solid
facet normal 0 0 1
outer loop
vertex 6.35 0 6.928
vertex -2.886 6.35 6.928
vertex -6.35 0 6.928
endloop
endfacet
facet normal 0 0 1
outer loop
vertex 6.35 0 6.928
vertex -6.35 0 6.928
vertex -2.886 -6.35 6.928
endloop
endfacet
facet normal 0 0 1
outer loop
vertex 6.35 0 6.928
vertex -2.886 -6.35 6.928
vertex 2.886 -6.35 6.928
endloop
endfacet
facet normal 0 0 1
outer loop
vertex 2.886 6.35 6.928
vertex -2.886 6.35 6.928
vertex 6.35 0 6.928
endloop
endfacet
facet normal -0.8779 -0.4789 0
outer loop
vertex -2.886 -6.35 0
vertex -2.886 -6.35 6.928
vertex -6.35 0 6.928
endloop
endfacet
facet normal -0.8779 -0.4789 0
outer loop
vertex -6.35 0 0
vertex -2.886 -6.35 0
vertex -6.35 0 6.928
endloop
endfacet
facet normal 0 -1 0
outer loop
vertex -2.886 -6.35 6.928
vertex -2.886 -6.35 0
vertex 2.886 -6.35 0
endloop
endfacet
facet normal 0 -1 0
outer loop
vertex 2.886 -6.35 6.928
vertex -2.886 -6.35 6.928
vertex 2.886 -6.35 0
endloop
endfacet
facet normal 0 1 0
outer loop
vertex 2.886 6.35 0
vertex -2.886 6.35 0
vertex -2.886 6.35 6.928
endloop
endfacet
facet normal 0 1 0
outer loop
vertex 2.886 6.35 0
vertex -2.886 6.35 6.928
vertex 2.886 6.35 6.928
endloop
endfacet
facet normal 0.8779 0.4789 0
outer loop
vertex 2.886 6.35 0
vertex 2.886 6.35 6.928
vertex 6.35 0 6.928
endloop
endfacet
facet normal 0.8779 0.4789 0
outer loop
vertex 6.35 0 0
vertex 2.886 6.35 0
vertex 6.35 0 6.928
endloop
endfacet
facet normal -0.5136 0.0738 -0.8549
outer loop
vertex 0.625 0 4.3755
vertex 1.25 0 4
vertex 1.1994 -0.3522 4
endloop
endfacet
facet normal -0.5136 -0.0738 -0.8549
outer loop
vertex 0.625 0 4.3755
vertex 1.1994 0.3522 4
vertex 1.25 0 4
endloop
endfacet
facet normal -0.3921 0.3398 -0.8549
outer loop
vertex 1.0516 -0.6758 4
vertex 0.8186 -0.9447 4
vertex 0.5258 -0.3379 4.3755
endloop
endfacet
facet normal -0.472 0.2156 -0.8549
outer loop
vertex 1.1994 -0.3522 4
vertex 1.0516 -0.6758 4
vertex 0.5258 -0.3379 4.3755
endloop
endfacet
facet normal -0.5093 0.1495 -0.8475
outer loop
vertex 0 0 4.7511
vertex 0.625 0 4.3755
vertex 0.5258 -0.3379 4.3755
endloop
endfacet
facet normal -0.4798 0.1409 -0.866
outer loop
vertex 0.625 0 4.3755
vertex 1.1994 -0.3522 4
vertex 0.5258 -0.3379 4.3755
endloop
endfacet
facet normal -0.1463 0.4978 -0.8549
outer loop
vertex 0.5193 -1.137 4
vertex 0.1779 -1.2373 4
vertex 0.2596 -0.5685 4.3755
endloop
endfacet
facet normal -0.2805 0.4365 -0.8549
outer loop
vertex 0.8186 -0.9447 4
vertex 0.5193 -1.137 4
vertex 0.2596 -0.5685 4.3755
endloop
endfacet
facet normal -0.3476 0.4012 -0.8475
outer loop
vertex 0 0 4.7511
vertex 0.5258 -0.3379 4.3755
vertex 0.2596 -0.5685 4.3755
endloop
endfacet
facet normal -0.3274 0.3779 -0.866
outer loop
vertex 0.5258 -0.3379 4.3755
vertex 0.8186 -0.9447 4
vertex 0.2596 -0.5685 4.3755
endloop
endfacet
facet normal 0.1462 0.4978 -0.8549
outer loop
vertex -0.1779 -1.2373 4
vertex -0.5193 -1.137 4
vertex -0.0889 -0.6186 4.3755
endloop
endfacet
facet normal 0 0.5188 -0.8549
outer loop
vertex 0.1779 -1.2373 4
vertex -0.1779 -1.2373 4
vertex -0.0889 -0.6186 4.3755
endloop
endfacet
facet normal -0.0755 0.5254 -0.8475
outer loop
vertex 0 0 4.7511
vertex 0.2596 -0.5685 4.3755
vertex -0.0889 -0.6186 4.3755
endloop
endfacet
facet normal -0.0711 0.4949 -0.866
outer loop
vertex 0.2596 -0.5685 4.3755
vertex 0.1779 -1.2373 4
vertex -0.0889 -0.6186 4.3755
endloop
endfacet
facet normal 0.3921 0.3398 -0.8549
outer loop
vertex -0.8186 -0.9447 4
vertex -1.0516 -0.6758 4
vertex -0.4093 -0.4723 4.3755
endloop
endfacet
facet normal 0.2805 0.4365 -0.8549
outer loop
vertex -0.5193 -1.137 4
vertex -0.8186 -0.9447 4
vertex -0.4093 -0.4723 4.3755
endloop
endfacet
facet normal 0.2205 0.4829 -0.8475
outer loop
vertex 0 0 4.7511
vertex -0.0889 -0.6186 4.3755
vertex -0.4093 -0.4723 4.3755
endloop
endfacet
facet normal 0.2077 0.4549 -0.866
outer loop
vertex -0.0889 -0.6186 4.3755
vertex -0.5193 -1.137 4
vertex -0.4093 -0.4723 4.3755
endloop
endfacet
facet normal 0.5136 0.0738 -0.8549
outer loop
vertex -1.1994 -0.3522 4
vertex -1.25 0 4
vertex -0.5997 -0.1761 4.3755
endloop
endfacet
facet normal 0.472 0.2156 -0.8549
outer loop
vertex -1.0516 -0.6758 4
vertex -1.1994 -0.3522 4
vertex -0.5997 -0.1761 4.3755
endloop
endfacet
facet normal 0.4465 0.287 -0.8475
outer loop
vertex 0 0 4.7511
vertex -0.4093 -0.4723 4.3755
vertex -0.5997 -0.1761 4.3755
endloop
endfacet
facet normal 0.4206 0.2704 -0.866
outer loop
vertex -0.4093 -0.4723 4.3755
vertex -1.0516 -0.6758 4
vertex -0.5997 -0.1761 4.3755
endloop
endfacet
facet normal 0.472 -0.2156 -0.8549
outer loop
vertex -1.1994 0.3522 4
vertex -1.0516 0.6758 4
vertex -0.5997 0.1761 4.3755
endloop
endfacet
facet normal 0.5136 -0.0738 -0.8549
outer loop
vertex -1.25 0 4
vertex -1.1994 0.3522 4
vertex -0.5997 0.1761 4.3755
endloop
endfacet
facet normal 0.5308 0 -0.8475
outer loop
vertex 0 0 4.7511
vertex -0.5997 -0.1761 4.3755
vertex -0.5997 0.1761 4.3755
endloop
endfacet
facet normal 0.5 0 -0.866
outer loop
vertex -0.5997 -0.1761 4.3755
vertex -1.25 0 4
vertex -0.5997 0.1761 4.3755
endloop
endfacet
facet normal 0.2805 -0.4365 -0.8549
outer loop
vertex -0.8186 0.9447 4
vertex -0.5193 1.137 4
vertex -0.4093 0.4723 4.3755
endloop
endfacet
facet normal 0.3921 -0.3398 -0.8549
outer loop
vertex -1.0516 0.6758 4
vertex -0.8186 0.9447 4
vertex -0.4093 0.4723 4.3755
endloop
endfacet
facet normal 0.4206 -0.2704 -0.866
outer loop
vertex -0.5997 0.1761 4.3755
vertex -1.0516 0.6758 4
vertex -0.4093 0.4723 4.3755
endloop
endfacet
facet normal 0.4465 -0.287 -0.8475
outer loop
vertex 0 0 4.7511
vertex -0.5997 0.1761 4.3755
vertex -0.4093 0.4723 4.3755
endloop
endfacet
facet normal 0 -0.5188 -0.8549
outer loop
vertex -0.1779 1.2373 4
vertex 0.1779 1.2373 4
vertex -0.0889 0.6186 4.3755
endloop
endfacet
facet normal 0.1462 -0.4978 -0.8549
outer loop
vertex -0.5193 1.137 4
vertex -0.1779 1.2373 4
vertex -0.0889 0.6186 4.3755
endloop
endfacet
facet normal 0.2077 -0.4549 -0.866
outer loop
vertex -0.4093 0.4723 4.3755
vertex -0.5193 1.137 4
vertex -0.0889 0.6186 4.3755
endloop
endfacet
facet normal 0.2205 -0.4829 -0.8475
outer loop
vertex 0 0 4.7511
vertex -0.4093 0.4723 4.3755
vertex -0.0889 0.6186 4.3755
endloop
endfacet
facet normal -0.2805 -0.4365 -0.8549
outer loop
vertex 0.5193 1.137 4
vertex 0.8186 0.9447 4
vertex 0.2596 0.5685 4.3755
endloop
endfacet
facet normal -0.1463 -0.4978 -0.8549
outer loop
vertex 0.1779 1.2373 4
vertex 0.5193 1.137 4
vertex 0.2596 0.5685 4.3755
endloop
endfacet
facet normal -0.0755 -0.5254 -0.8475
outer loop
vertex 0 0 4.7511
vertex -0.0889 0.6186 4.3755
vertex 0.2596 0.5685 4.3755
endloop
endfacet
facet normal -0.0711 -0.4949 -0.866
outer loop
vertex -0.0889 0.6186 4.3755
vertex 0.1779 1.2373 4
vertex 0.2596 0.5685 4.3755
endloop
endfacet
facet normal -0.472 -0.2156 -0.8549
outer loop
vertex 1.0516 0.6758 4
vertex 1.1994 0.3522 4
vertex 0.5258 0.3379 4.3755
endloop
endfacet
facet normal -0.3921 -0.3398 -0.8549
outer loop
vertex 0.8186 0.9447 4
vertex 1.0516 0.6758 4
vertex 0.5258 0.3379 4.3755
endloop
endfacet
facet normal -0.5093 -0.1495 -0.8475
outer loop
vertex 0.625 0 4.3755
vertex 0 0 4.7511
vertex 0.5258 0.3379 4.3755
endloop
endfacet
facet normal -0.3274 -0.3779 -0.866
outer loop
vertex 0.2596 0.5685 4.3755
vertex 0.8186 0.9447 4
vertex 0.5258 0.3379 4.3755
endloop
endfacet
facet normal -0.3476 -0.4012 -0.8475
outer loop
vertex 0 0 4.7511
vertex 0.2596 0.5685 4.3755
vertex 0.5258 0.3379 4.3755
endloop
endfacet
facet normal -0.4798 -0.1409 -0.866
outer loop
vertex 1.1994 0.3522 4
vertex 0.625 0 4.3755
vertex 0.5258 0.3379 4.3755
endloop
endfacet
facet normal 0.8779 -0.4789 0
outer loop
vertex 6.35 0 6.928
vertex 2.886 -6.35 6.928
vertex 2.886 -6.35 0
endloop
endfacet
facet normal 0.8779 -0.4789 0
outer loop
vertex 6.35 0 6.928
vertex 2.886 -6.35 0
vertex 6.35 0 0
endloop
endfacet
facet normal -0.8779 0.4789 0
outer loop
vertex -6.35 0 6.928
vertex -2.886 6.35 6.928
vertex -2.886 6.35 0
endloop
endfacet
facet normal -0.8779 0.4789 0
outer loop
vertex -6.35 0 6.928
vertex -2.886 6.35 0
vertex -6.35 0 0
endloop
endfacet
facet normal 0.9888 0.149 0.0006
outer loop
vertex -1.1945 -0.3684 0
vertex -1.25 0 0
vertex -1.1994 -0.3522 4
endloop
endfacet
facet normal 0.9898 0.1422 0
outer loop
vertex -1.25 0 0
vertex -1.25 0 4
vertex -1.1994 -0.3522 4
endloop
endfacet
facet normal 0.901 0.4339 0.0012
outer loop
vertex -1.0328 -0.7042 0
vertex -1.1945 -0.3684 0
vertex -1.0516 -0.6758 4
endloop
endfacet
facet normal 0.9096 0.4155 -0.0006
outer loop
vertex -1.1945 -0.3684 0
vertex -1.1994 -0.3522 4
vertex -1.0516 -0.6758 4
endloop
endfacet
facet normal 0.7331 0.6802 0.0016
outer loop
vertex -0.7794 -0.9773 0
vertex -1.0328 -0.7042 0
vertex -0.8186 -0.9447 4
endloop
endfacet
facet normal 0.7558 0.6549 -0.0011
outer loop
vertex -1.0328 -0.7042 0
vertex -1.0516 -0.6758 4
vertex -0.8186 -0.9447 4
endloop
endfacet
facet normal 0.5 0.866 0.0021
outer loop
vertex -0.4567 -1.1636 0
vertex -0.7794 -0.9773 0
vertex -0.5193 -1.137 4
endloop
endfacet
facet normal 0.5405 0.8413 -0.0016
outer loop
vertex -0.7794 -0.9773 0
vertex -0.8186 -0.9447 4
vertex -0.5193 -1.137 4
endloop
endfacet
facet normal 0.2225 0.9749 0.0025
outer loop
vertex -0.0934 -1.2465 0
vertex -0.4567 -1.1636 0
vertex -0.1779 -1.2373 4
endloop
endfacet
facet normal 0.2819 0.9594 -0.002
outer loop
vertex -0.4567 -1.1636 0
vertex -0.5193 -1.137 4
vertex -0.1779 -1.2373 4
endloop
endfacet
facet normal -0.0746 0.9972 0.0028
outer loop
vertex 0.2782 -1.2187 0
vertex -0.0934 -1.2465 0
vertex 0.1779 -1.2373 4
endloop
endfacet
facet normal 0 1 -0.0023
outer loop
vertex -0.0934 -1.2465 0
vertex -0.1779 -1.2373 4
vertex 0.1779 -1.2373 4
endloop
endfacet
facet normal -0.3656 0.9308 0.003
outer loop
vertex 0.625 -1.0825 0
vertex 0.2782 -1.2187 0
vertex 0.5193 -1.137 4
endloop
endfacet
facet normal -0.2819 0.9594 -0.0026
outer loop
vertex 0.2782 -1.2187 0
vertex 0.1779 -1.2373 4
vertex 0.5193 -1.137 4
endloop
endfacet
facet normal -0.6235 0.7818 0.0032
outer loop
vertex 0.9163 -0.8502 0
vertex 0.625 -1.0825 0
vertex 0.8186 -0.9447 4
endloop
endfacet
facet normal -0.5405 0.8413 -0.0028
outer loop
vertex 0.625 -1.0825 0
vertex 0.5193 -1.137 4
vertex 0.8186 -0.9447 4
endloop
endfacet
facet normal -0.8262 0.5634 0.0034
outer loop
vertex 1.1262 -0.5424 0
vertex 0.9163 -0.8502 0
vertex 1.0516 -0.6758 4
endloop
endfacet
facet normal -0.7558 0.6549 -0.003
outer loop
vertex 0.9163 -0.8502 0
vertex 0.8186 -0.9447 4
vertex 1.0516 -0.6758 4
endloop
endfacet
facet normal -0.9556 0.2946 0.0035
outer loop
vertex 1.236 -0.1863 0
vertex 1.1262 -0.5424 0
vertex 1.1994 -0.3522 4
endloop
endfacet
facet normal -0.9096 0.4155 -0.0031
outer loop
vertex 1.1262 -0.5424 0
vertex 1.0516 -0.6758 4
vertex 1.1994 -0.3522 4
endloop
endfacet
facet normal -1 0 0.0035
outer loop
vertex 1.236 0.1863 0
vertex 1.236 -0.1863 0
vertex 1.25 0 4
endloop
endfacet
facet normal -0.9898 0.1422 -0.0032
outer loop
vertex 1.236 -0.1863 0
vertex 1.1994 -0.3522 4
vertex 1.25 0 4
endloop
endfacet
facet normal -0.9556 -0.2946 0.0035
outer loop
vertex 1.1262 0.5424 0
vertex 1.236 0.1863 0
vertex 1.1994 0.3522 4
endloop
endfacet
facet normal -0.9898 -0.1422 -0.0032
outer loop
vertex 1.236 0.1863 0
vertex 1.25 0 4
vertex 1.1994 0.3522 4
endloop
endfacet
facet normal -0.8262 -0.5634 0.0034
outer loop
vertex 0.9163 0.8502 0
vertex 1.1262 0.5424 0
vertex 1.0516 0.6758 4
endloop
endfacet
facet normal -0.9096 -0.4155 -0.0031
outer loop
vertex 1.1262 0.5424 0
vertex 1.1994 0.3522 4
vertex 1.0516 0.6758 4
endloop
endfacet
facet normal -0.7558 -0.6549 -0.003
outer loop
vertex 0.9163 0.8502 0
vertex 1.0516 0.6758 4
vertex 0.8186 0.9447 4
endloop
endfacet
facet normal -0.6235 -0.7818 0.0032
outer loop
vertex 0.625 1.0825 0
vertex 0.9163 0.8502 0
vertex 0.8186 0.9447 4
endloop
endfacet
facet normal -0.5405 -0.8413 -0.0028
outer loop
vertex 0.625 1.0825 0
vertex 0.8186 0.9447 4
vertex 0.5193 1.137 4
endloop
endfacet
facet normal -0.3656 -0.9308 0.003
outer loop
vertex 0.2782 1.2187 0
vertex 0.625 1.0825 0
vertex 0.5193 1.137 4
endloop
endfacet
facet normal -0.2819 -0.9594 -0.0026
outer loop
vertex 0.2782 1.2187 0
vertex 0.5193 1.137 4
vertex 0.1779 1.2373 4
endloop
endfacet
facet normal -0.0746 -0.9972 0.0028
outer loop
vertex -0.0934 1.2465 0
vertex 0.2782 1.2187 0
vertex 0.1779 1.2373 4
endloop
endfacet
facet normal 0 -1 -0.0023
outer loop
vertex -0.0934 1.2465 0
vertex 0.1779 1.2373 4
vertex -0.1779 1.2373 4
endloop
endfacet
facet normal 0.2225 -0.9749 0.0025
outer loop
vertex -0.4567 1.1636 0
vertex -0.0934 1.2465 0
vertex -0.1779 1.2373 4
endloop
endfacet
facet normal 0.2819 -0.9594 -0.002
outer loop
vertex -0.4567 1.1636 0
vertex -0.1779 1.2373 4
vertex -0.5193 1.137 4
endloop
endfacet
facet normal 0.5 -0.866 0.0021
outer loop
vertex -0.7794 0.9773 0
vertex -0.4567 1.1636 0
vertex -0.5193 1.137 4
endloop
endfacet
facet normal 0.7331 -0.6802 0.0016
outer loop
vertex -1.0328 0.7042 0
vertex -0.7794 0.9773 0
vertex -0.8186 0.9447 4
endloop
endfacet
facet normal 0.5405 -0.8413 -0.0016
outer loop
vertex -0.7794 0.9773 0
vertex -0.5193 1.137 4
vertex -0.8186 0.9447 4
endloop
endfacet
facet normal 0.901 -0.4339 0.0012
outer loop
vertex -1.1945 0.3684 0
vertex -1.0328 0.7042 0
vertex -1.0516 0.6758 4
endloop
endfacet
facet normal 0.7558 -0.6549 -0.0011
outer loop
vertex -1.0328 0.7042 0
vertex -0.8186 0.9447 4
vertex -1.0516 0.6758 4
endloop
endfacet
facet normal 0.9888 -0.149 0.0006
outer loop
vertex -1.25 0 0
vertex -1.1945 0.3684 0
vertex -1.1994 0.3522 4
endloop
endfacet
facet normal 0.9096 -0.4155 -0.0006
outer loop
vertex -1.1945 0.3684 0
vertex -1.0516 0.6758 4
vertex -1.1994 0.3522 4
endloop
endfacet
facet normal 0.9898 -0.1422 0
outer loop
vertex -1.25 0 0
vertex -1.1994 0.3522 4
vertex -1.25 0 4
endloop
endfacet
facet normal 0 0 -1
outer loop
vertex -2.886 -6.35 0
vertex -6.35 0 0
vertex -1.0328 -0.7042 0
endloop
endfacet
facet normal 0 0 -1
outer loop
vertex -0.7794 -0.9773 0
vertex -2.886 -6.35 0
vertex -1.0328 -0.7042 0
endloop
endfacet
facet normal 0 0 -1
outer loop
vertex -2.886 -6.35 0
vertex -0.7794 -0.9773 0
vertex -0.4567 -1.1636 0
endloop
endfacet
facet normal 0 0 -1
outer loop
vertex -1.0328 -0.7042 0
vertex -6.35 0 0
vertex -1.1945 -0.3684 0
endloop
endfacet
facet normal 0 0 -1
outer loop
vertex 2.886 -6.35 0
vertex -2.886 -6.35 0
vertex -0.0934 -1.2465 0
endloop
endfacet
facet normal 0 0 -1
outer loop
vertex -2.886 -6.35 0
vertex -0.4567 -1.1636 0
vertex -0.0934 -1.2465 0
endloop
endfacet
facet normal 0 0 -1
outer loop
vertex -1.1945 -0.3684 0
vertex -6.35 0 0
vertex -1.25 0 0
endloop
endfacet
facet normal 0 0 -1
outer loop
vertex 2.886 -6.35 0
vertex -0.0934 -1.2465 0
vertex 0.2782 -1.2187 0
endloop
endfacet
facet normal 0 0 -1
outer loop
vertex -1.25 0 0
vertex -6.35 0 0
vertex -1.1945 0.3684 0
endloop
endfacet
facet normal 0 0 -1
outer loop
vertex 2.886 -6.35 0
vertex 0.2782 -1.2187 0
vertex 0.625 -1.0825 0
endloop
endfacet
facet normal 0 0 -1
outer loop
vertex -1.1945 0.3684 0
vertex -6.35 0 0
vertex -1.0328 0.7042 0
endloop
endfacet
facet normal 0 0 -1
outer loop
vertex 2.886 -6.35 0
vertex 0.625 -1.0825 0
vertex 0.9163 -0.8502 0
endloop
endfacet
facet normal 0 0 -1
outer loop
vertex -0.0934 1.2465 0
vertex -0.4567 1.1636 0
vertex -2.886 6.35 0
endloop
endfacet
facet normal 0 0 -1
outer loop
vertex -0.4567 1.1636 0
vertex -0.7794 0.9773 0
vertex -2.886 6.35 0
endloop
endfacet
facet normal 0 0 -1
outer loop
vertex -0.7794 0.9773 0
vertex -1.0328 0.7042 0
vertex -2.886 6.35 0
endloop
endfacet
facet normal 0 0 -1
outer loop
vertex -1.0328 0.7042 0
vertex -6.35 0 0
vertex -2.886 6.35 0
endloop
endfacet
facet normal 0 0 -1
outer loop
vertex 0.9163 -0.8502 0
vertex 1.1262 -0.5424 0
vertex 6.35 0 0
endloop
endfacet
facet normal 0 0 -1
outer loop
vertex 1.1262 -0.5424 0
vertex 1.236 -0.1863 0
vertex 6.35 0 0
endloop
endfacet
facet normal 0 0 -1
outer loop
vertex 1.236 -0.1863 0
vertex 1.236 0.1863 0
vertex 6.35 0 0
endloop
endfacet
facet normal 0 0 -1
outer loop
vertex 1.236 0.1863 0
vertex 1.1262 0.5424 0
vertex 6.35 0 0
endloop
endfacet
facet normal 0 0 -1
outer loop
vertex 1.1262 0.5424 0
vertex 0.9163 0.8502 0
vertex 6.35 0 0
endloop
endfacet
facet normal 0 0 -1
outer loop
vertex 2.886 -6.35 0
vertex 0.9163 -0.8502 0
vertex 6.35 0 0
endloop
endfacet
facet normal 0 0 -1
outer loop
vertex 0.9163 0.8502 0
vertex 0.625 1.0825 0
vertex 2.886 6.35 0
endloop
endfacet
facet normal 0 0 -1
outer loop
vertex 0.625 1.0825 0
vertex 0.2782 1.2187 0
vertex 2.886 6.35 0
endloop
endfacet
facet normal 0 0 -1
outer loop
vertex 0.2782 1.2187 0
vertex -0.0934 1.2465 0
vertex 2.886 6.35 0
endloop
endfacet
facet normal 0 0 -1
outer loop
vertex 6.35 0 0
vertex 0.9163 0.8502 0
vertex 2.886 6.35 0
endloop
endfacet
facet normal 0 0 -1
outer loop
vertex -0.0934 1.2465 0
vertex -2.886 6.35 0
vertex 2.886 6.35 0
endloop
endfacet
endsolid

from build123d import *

# Parameters (mm, degrees)
SKETCH1_W                       = 12.7
SKETCH1_H                       = 12.7
BOSS_EXTRUDE1_DEPTH             = 6.928
TAP_DRILL_FOR_M3X0_5_TAP3_D     = 2.5
TAP_DRILL_FOR_M3X0_5_TAP3_DEPTH = 4
TAP_DRILL_FOR_M3X0_5_TAP3_TIP   = 0.751075774
CUT_EXTRUDE1_DEPTH              = 12.342053782
MIRROR2_COPY_1_DEPTH            = 12.342053782


with BuildPart() as part:
    # Sketch1 → Boss-Extrude1 (new body)
    with BuildSketch(Plane.XY):
        Rectangle(SKETCH1_W, SKETCH1_H)
    extrude(amount=BOSS_EXTRUDE1_DEPTH)

    # Tap Drill for M3x0.5 Tap3
    with Locations(Plane(origin=(0, 0, 0), x_dir=(1, 0, 0), z_dir=(0, 0, -1))):
        with Locations((0, 0)):
            Hole(TAP_DRILL_FOR_M3X0_5_TAP3_D / 2, depth=TAP_DRILL_FOR_M3X0_5_TAP3_DEPTH)
            with Locations((0, 0, -(TAP_DRILL_FOR_M3X0_5_TAP3_DEPTH + TAP_DRILL_FOR_M3X0_5_TAP3_TIP / 2))):  # 118° drill point
                Cone(0, TAP_DRILL_FOR_M3X0_5_TAP3_D / 2, TAP_DRILL_FOR_M3X0_5_TAP3_TIP, mode=Mode.SUBTRACT)

    # Sketch8 → Cut-Extrude1 (cut, symmetric)
    with BuildSketch(Plane.XY):
        Polygon((-16.943244885, 42.69979937), (2.886, 6.35), (6.35, 0), (26.179244885, -36.34979937), (98.878843624, 3.308690399), (55.756353855, 82.358289139), align=None)
    cut_extrude1 = extrude(amount=CUT_EXTRUDE1_DEPTH, both=True, mode=Mode.SUBTRACT)

    # Mirror1: Cut-Extrude1 across plane
    add(cut_extrude1.mirror(Plane.ZX), mode=Mode.SUBTRACT)

    # Mirror2: Cut-Extrude1 across plane
    add(cut_extrude1.mirror(Plane(origin=(0, 0, 0), x_dir=(0, 0, 1), z_dir=(1, 0, 0))), mode=Mode.SUBTRACT)

    # Mirror2 copy 1 sketch → Mirror2 copy 1 (cut, symmetric)
    with BuildSketch(Plane(origin=(0, 0, 0), x_dir=(-1, 0, 0), z_dir=(0, 0, 1))):
        Polygon((-16.943244885, 42.69979937), (2.886, 6.35), (6.35, 0), (26.179244885, -36.34979937), (98.878843624, 3.308690399), (55.756353855, 82.358289139), align=None)
    extrude(amount=MIRROR2_COPY_1_DEPTH, both=True, mode=Mode.SUBTRACT)


solid = part.part
